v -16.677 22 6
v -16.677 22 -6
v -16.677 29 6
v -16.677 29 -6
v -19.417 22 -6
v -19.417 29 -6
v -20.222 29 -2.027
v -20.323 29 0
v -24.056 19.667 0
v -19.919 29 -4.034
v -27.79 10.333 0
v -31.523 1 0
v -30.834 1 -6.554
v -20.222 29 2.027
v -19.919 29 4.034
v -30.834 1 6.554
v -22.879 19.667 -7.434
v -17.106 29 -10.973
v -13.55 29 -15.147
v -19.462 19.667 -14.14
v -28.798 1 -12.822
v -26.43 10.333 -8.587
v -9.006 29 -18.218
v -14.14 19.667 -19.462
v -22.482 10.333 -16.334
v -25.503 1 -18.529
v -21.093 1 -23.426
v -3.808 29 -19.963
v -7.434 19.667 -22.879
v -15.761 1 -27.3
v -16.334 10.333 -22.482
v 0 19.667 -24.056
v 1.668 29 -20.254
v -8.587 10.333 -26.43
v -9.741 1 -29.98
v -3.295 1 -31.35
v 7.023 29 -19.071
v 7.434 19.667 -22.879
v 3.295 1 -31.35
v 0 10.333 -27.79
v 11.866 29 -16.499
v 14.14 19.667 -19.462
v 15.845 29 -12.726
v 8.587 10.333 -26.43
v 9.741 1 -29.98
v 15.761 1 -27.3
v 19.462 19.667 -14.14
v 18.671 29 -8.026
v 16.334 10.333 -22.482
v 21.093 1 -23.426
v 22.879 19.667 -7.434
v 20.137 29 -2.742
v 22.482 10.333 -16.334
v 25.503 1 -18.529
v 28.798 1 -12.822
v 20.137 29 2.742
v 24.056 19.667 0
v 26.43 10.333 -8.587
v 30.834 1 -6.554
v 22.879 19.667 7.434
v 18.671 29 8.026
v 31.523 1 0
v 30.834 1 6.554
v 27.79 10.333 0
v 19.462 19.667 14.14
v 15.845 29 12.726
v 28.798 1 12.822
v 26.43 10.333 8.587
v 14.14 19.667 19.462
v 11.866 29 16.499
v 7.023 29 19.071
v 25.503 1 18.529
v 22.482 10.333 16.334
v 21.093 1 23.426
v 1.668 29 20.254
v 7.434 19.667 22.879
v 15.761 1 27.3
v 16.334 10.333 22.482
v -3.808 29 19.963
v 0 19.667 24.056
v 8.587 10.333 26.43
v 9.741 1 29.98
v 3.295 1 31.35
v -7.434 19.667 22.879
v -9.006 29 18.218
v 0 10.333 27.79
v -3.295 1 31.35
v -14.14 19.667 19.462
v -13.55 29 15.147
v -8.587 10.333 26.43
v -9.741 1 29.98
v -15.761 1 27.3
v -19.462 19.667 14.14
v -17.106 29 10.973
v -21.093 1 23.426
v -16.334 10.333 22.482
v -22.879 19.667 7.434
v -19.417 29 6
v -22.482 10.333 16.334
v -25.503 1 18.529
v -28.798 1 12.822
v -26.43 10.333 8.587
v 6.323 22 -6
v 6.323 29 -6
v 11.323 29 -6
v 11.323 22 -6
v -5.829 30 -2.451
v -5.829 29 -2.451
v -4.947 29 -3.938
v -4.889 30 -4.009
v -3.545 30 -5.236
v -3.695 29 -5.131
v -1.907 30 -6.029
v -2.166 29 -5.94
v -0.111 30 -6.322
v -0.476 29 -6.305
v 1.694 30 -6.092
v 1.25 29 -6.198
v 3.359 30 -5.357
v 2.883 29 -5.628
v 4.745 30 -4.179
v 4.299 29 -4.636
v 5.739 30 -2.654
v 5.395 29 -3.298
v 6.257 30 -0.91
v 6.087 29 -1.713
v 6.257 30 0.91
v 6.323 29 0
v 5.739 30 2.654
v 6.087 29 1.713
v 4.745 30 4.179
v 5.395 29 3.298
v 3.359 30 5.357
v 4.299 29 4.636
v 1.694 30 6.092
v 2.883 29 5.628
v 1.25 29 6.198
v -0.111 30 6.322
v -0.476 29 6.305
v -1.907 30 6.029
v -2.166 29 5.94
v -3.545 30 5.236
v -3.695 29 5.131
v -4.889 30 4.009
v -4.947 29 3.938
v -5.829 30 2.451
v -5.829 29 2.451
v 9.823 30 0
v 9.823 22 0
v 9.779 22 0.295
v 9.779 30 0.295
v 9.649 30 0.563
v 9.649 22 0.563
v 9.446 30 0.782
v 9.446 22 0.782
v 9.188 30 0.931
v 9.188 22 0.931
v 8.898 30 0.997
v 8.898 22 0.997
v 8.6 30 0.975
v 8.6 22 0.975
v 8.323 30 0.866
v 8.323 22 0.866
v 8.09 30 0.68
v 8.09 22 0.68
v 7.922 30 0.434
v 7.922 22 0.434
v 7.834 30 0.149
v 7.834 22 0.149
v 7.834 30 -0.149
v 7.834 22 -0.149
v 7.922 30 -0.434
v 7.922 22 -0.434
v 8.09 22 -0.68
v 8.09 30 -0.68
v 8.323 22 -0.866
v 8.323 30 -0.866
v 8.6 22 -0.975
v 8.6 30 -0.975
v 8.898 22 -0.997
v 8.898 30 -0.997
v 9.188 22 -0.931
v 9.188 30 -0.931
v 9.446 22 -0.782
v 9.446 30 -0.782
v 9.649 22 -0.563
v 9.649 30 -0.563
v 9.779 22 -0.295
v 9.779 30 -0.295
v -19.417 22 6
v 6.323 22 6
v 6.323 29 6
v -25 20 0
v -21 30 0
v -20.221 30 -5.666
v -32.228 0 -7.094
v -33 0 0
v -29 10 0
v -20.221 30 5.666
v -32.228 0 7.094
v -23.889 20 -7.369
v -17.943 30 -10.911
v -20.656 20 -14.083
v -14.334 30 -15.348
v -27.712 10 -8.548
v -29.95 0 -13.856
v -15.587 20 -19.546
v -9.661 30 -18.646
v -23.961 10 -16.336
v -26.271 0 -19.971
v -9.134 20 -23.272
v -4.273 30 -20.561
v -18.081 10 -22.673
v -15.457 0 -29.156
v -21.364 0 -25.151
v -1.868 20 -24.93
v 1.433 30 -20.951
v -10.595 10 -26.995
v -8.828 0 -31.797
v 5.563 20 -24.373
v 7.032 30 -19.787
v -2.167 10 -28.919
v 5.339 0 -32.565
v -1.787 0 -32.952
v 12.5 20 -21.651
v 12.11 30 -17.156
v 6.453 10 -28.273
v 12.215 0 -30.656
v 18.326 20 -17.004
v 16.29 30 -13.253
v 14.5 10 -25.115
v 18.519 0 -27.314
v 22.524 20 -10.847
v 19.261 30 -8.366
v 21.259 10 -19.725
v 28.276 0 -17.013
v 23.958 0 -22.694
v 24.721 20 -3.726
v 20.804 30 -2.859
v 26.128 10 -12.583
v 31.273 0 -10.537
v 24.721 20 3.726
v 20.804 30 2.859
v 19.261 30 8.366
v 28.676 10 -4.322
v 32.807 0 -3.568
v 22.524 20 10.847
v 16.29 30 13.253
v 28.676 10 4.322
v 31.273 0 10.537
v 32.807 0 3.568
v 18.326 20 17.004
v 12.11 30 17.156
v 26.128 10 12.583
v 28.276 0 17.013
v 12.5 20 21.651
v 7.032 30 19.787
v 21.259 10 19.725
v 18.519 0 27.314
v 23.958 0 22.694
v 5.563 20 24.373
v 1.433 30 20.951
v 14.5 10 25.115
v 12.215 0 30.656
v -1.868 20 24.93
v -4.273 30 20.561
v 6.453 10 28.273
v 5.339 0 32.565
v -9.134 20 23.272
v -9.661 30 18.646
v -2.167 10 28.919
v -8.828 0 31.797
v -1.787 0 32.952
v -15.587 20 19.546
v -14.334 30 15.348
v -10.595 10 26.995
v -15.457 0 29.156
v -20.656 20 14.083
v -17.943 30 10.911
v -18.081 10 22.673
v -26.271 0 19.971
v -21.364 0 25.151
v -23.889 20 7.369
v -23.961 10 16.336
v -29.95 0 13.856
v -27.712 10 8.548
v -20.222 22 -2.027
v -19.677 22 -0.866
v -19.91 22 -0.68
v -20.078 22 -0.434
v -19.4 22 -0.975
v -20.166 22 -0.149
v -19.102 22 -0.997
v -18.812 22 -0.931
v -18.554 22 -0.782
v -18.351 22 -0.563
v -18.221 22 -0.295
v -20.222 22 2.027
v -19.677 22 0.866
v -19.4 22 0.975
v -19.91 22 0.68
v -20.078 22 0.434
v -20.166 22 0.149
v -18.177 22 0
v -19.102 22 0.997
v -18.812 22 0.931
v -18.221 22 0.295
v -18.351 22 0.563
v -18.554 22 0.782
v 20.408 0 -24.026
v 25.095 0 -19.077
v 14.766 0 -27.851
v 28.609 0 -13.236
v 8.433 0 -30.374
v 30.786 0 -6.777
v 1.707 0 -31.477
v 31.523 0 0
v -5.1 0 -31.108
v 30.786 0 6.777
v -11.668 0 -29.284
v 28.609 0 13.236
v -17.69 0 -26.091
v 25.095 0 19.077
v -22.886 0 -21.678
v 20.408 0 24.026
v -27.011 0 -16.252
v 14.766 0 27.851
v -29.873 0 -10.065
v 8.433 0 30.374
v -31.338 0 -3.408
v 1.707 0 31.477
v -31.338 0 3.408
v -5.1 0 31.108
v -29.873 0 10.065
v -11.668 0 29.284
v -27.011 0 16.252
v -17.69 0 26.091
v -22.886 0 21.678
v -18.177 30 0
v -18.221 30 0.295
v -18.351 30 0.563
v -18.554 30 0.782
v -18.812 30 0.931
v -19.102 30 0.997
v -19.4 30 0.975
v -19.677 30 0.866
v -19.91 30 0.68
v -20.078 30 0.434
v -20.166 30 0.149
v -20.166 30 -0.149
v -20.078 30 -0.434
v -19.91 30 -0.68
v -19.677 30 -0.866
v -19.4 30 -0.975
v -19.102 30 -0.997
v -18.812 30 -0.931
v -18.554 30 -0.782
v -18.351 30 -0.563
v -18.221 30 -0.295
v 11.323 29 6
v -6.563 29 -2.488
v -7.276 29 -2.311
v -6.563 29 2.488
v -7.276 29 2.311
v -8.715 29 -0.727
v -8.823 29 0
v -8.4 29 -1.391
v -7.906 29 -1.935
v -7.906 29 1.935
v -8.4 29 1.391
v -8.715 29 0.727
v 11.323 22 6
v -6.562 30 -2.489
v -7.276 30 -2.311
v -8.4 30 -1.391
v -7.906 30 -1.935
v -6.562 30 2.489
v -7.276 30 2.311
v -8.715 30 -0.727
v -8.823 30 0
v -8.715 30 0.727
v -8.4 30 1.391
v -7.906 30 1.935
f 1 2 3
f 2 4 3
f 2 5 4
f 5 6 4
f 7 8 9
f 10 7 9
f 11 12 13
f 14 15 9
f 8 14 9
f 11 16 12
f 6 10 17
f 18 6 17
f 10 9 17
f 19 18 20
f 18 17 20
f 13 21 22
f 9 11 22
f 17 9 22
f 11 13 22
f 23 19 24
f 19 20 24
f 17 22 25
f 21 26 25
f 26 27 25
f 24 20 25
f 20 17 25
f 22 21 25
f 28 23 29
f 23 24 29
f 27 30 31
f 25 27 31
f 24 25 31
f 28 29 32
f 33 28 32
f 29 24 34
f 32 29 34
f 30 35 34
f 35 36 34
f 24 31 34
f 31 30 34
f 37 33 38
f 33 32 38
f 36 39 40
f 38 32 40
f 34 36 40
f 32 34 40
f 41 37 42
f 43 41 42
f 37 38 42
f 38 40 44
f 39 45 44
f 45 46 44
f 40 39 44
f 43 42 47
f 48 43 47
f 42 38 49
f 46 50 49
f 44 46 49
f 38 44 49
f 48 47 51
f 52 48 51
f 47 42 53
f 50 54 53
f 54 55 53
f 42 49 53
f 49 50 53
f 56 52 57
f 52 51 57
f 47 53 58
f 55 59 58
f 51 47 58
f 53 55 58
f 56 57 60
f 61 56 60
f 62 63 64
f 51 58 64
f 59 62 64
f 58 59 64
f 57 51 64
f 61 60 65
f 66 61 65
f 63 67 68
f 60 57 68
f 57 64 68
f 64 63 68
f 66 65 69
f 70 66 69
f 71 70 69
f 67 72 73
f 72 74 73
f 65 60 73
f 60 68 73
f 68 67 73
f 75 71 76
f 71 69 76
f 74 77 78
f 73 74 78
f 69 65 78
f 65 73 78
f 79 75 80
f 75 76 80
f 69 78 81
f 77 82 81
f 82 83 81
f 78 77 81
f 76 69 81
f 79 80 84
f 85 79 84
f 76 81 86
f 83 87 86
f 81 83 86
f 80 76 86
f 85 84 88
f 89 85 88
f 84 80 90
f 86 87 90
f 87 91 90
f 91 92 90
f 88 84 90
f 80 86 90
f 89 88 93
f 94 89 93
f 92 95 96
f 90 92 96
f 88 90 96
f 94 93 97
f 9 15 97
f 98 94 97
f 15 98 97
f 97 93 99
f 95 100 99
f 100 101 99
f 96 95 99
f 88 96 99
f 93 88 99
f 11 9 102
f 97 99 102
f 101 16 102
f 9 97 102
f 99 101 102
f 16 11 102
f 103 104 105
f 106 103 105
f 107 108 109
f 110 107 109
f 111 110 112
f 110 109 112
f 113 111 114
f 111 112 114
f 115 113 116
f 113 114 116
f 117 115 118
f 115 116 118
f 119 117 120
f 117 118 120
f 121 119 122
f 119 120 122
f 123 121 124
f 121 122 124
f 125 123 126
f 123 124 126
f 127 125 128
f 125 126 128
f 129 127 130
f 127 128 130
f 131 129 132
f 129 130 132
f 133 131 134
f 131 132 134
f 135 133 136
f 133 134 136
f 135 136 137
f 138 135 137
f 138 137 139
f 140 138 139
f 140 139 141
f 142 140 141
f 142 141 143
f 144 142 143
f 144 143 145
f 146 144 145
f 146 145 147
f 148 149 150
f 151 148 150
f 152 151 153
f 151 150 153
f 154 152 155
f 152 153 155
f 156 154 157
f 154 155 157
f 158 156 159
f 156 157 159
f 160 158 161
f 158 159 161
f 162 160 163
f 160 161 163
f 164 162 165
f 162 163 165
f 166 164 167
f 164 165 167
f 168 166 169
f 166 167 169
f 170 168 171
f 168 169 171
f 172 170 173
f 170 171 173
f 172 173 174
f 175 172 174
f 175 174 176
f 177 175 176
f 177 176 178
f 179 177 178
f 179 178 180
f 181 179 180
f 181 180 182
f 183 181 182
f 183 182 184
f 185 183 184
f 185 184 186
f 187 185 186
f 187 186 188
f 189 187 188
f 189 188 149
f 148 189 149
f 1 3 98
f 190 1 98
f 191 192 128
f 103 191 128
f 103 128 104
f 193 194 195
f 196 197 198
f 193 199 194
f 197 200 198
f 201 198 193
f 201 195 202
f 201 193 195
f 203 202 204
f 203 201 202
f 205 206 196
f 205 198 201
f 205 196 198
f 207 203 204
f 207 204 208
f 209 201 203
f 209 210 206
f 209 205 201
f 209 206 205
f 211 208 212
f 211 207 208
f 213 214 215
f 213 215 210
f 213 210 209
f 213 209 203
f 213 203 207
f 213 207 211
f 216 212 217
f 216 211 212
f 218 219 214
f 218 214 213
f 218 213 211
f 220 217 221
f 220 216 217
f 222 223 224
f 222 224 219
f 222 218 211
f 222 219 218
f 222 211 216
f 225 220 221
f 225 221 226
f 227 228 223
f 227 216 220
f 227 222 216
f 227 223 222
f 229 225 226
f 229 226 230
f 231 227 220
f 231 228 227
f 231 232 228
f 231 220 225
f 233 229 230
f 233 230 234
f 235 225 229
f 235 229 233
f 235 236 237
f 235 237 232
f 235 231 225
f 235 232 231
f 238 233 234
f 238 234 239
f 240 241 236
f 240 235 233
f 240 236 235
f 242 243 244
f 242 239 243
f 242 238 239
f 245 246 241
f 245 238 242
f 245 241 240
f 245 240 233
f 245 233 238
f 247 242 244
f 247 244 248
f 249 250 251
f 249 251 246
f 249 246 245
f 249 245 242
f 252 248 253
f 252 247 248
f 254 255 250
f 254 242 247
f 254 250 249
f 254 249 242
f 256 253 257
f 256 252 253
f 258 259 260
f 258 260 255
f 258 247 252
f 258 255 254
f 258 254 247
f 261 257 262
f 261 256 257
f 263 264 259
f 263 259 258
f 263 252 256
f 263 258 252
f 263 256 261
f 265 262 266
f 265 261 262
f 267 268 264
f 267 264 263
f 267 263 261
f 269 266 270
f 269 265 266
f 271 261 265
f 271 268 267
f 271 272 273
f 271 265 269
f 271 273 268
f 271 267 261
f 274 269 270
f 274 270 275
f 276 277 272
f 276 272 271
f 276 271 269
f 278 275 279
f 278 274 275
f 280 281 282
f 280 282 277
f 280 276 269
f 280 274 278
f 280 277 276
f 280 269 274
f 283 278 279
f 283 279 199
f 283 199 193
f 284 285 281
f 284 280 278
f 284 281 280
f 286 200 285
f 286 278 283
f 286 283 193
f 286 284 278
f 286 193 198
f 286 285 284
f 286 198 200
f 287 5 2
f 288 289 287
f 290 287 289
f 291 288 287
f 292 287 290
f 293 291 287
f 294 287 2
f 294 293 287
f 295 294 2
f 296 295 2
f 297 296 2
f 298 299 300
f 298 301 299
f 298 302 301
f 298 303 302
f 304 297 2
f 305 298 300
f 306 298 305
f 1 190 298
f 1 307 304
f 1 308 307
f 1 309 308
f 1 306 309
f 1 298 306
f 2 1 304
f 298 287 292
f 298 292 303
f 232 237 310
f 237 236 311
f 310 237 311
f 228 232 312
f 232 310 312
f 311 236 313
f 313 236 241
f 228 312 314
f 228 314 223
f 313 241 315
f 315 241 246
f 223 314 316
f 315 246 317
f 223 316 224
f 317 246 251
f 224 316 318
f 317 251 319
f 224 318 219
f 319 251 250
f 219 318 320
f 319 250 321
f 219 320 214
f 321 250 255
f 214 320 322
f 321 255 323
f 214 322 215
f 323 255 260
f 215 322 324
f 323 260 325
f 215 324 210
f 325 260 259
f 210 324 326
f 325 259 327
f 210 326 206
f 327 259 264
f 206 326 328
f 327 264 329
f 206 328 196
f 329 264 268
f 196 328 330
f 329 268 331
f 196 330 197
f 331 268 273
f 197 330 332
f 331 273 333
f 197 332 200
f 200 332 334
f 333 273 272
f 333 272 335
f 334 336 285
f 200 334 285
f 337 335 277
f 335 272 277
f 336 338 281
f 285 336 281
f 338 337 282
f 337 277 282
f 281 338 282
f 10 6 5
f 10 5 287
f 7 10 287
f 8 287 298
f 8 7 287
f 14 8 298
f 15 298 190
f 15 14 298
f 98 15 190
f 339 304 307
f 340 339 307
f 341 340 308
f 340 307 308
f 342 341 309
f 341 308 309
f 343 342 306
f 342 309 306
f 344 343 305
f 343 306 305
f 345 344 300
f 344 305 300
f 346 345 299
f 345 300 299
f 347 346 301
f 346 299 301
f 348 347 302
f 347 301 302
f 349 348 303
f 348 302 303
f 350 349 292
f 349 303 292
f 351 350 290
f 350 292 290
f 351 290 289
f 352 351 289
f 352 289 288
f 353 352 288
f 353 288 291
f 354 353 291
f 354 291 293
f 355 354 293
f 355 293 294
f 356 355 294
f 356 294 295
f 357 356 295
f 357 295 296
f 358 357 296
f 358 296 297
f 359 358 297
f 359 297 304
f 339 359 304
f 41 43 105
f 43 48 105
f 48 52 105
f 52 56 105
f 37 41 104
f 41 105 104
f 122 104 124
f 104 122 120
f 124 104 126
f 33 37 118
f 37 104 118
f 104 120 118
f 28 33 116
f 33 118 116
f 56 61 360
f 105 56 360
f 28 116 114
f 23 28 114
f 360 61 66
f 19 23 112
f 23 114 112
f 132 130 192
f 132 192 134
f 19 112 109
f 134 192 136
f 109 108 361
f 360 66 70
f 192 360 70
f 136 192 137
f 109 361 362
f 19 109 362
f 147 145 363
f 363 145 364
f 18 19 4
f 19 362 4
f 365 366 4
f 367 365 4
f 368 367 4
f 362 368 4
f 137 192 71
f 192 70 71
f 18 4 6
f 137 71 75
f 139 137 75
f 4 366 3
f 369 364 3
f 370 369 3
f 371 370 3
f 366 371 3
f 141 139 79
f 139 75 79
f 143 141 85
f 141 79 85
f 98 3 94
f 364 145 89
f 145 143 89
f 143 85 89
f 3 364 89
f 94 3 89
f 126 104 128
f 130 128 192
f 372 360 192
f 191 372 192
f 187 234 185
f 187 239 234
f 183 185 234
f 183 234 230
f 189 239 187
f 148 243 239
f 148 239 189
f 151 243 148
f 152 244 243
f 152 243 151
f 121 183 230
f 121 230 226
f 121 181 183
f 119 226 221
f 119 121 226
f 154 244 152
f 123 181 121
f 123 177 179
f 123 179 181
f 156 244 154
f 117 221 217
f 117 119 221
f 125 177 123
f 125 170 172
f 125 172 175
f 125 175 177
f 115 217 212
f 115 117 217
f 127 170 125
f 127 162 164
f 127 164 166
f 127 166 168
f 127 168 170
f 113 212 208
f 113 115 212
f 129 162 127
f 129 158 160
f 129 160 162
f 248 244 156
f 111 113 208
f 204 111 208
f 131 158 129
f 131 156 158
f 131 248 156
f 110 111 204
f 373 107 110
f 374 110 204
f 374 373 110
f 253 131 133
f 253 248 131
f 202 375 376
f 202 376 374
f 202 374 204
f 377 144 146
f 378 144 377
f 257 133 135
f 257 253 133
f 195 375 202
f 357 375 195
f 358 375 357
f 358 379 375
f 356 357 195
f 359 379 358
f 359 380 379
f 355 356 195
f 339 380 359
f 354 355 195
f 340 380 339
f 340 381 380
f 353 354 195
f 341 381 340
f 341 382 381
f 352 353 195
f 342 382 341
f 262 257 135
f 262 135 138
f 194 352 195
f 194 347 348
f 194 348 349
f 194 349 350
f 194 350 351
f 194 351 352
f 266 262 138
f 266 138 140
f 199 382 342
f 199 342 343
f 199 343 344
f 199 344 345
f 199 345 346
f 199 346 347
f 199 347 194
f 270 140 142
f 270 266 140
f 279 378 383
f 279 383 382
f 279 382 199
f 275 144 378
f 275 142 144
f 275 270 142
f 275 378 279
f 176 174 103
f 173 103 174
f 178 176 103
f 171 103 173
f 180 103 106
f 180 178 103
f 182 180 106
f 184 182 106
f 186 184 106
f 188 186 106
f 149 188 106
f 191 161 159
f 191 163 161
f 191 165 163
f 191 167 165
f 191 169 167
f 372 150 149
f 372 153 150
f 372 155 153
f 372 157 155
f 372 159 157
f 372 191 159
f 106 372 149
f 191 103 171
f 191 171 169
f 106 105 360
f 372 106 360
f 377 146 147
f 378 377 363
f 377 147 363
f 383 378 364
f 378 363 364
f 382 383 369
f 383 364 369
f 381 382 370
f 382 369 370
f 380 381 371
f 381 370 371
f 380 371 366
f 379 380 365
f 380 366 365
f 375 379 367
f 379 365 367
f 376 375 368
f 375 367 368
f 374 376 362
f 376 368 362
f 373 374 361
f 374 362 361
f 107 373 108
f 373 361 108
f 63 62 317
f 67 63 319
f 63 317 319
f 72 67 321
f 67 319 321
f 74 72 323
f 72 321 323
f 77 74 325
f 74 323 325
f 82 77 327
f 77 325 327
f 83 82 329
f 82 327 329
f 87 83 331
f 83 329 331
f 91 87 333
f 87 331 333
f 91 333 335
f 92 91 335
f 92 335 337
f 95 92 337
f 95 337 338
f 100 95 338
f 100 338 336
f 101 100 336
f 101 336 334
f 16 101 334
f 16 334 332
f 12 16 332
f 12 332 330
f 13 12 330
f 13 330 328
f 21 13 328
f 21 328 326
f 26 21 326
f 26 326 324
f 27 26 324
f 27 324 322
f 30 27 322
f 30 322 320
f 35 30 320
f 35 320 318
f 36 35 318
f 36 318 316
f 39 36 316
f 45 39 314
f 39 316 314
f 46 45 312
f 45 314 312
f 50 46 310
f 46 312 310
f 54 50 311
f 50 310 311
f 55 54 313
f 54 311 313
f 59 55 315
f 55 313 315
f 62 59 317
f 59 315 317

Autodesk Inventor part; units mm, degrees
ref_plane "YZ Plane" through (0, 0, 0) normal (1, 0, 0) x (0, 1, 0)
ref_plane "XY Plane" through (0, 0, 0) normal (0, 0, 1) x (1, 0, 0)
sketch "Sketch1" plane through (0, 0, 0) normal (0, 1, 0) x (-1, 0, 0)
  circle A0 centre (0, 0) radius 32
  circle A1 centre (0, 0) radius 33
  dimension "d0" = 64
  dimension "d1" = 0
  dimension "d2" = 0
  dimension "d3" = 66
ref_plane "Work Plane1" through (0, 30, 0) normal (0, 1, 0) x (-1, 0, 0)
sketch "Sketch2" plane through (0, 30, 0) normal (0, 1, 0) x (-1, 0, 0)
  circle A0 centre (0, 0) radius 20
  circle A1 centre (0, 0) radius 21
  dimension "d5" = 40
  dimension "d6" = 42
loft "Loft1" add profiles "Sketch2", "Sketch1" contours A0 | A1 / A0 | A1
shell "Shell2" thickness 1 removed faces 0
sketch "Sketch3" plane through (0, 0, 0) normal (0, -1, 0) x (1, 0, 0)
  circle A0 centre (0, 0) radius 31.523
extrude "Extrusion1" cut sketch "Sketch3" against normal blind 1
sketch "Sketch5" plane through (0, 29, 0) normal (0, -1, 0) x (1, 0, 0)
  line L0 (11.323, 6) -> (6.323, 6)
  line L1 (6.323, 6) -> (6.323, -6)
  line L2 (6.323, -6) -> (11.323, -6)
  line L3 (11.323, -6) -> (11.323, 6)
  circle A0 centre (0, 0) radius 20.323 projected
  circle A1 centre (0, 0) radius 6.323
  circle A2 centre (-6.323, 0) radius 2.5
  line L4 (-16.677, 6) -> (-21.677, 6)
  line L5 (-21.677, 6) -> (-21.677, -6)
  line L6 (-21.677, -6) -> (-16.677, -6)
  line L7 (-16.677, -6) -> (-16.677, 6)
  arc A3 (-19.4171, 6) -> (-19.4171, -6) centre (0, 0) ccw
  dimension "d16" = 5
  dimension "d17" = 12
  dimension "d18" = 9
  dimension "d19" = 6
  dimension "d20" = 5
  dimension "d21" = 5
  dimension "d22" = 12
  dimension "d23" = 23
extrude "Extrusion2" add sketch "Sketch5" along normal blind 7 contours L3 L2 L1 L0 | A1 A2 | A2 A1 | A1 A2 | L4 L7 L6 A0 picked at (-17.8586, -0.6756)
sketch "Sketch6" plane through (0, 22, 0) normal (0, -1, 0) x (1, 0, 0)
  arc A0 (-5.8287, 2.4507) -> (-5.8287, -2.4507) centre (-6.323, 0) ccw projected
  circle A1 centre (0, 0) radius 6.323
  circle A2 centre (-6.323, 0) radius 2.5
extrude "Extrusion3" cut sketch "Sketch6" against normal blind 20
sketch "Sketch7" plane through (0, 22, 0) normal (0, -1, 0) x (1, 0, 0)
  circle A0 centre (8.823, 0) radius 1
  circle A1 centre (-19.177, 0) radius 1
  line L0 (11.323, -6) -> (11.323, 6) projected
  line L1 (11.323, 6) -> (6.323, 6) projected
  line L2 (-16.677, -6) -> (-16.677, 6) projected
  line L3 (-16.677, 6) -> (-19.4171, 6) projected
  point P0 (0, 0)
  dimension "d28" = 2
  dimension "d29" = 2
  dimension "d30" = 2.5
  dimension "d31" = 6
  dimension "d32" = 2.5
  dimension "d33" = 6
extrude "Extrusion4" cut sketch "Sketch7" against normal blind 20
properties part number "zaklad"
